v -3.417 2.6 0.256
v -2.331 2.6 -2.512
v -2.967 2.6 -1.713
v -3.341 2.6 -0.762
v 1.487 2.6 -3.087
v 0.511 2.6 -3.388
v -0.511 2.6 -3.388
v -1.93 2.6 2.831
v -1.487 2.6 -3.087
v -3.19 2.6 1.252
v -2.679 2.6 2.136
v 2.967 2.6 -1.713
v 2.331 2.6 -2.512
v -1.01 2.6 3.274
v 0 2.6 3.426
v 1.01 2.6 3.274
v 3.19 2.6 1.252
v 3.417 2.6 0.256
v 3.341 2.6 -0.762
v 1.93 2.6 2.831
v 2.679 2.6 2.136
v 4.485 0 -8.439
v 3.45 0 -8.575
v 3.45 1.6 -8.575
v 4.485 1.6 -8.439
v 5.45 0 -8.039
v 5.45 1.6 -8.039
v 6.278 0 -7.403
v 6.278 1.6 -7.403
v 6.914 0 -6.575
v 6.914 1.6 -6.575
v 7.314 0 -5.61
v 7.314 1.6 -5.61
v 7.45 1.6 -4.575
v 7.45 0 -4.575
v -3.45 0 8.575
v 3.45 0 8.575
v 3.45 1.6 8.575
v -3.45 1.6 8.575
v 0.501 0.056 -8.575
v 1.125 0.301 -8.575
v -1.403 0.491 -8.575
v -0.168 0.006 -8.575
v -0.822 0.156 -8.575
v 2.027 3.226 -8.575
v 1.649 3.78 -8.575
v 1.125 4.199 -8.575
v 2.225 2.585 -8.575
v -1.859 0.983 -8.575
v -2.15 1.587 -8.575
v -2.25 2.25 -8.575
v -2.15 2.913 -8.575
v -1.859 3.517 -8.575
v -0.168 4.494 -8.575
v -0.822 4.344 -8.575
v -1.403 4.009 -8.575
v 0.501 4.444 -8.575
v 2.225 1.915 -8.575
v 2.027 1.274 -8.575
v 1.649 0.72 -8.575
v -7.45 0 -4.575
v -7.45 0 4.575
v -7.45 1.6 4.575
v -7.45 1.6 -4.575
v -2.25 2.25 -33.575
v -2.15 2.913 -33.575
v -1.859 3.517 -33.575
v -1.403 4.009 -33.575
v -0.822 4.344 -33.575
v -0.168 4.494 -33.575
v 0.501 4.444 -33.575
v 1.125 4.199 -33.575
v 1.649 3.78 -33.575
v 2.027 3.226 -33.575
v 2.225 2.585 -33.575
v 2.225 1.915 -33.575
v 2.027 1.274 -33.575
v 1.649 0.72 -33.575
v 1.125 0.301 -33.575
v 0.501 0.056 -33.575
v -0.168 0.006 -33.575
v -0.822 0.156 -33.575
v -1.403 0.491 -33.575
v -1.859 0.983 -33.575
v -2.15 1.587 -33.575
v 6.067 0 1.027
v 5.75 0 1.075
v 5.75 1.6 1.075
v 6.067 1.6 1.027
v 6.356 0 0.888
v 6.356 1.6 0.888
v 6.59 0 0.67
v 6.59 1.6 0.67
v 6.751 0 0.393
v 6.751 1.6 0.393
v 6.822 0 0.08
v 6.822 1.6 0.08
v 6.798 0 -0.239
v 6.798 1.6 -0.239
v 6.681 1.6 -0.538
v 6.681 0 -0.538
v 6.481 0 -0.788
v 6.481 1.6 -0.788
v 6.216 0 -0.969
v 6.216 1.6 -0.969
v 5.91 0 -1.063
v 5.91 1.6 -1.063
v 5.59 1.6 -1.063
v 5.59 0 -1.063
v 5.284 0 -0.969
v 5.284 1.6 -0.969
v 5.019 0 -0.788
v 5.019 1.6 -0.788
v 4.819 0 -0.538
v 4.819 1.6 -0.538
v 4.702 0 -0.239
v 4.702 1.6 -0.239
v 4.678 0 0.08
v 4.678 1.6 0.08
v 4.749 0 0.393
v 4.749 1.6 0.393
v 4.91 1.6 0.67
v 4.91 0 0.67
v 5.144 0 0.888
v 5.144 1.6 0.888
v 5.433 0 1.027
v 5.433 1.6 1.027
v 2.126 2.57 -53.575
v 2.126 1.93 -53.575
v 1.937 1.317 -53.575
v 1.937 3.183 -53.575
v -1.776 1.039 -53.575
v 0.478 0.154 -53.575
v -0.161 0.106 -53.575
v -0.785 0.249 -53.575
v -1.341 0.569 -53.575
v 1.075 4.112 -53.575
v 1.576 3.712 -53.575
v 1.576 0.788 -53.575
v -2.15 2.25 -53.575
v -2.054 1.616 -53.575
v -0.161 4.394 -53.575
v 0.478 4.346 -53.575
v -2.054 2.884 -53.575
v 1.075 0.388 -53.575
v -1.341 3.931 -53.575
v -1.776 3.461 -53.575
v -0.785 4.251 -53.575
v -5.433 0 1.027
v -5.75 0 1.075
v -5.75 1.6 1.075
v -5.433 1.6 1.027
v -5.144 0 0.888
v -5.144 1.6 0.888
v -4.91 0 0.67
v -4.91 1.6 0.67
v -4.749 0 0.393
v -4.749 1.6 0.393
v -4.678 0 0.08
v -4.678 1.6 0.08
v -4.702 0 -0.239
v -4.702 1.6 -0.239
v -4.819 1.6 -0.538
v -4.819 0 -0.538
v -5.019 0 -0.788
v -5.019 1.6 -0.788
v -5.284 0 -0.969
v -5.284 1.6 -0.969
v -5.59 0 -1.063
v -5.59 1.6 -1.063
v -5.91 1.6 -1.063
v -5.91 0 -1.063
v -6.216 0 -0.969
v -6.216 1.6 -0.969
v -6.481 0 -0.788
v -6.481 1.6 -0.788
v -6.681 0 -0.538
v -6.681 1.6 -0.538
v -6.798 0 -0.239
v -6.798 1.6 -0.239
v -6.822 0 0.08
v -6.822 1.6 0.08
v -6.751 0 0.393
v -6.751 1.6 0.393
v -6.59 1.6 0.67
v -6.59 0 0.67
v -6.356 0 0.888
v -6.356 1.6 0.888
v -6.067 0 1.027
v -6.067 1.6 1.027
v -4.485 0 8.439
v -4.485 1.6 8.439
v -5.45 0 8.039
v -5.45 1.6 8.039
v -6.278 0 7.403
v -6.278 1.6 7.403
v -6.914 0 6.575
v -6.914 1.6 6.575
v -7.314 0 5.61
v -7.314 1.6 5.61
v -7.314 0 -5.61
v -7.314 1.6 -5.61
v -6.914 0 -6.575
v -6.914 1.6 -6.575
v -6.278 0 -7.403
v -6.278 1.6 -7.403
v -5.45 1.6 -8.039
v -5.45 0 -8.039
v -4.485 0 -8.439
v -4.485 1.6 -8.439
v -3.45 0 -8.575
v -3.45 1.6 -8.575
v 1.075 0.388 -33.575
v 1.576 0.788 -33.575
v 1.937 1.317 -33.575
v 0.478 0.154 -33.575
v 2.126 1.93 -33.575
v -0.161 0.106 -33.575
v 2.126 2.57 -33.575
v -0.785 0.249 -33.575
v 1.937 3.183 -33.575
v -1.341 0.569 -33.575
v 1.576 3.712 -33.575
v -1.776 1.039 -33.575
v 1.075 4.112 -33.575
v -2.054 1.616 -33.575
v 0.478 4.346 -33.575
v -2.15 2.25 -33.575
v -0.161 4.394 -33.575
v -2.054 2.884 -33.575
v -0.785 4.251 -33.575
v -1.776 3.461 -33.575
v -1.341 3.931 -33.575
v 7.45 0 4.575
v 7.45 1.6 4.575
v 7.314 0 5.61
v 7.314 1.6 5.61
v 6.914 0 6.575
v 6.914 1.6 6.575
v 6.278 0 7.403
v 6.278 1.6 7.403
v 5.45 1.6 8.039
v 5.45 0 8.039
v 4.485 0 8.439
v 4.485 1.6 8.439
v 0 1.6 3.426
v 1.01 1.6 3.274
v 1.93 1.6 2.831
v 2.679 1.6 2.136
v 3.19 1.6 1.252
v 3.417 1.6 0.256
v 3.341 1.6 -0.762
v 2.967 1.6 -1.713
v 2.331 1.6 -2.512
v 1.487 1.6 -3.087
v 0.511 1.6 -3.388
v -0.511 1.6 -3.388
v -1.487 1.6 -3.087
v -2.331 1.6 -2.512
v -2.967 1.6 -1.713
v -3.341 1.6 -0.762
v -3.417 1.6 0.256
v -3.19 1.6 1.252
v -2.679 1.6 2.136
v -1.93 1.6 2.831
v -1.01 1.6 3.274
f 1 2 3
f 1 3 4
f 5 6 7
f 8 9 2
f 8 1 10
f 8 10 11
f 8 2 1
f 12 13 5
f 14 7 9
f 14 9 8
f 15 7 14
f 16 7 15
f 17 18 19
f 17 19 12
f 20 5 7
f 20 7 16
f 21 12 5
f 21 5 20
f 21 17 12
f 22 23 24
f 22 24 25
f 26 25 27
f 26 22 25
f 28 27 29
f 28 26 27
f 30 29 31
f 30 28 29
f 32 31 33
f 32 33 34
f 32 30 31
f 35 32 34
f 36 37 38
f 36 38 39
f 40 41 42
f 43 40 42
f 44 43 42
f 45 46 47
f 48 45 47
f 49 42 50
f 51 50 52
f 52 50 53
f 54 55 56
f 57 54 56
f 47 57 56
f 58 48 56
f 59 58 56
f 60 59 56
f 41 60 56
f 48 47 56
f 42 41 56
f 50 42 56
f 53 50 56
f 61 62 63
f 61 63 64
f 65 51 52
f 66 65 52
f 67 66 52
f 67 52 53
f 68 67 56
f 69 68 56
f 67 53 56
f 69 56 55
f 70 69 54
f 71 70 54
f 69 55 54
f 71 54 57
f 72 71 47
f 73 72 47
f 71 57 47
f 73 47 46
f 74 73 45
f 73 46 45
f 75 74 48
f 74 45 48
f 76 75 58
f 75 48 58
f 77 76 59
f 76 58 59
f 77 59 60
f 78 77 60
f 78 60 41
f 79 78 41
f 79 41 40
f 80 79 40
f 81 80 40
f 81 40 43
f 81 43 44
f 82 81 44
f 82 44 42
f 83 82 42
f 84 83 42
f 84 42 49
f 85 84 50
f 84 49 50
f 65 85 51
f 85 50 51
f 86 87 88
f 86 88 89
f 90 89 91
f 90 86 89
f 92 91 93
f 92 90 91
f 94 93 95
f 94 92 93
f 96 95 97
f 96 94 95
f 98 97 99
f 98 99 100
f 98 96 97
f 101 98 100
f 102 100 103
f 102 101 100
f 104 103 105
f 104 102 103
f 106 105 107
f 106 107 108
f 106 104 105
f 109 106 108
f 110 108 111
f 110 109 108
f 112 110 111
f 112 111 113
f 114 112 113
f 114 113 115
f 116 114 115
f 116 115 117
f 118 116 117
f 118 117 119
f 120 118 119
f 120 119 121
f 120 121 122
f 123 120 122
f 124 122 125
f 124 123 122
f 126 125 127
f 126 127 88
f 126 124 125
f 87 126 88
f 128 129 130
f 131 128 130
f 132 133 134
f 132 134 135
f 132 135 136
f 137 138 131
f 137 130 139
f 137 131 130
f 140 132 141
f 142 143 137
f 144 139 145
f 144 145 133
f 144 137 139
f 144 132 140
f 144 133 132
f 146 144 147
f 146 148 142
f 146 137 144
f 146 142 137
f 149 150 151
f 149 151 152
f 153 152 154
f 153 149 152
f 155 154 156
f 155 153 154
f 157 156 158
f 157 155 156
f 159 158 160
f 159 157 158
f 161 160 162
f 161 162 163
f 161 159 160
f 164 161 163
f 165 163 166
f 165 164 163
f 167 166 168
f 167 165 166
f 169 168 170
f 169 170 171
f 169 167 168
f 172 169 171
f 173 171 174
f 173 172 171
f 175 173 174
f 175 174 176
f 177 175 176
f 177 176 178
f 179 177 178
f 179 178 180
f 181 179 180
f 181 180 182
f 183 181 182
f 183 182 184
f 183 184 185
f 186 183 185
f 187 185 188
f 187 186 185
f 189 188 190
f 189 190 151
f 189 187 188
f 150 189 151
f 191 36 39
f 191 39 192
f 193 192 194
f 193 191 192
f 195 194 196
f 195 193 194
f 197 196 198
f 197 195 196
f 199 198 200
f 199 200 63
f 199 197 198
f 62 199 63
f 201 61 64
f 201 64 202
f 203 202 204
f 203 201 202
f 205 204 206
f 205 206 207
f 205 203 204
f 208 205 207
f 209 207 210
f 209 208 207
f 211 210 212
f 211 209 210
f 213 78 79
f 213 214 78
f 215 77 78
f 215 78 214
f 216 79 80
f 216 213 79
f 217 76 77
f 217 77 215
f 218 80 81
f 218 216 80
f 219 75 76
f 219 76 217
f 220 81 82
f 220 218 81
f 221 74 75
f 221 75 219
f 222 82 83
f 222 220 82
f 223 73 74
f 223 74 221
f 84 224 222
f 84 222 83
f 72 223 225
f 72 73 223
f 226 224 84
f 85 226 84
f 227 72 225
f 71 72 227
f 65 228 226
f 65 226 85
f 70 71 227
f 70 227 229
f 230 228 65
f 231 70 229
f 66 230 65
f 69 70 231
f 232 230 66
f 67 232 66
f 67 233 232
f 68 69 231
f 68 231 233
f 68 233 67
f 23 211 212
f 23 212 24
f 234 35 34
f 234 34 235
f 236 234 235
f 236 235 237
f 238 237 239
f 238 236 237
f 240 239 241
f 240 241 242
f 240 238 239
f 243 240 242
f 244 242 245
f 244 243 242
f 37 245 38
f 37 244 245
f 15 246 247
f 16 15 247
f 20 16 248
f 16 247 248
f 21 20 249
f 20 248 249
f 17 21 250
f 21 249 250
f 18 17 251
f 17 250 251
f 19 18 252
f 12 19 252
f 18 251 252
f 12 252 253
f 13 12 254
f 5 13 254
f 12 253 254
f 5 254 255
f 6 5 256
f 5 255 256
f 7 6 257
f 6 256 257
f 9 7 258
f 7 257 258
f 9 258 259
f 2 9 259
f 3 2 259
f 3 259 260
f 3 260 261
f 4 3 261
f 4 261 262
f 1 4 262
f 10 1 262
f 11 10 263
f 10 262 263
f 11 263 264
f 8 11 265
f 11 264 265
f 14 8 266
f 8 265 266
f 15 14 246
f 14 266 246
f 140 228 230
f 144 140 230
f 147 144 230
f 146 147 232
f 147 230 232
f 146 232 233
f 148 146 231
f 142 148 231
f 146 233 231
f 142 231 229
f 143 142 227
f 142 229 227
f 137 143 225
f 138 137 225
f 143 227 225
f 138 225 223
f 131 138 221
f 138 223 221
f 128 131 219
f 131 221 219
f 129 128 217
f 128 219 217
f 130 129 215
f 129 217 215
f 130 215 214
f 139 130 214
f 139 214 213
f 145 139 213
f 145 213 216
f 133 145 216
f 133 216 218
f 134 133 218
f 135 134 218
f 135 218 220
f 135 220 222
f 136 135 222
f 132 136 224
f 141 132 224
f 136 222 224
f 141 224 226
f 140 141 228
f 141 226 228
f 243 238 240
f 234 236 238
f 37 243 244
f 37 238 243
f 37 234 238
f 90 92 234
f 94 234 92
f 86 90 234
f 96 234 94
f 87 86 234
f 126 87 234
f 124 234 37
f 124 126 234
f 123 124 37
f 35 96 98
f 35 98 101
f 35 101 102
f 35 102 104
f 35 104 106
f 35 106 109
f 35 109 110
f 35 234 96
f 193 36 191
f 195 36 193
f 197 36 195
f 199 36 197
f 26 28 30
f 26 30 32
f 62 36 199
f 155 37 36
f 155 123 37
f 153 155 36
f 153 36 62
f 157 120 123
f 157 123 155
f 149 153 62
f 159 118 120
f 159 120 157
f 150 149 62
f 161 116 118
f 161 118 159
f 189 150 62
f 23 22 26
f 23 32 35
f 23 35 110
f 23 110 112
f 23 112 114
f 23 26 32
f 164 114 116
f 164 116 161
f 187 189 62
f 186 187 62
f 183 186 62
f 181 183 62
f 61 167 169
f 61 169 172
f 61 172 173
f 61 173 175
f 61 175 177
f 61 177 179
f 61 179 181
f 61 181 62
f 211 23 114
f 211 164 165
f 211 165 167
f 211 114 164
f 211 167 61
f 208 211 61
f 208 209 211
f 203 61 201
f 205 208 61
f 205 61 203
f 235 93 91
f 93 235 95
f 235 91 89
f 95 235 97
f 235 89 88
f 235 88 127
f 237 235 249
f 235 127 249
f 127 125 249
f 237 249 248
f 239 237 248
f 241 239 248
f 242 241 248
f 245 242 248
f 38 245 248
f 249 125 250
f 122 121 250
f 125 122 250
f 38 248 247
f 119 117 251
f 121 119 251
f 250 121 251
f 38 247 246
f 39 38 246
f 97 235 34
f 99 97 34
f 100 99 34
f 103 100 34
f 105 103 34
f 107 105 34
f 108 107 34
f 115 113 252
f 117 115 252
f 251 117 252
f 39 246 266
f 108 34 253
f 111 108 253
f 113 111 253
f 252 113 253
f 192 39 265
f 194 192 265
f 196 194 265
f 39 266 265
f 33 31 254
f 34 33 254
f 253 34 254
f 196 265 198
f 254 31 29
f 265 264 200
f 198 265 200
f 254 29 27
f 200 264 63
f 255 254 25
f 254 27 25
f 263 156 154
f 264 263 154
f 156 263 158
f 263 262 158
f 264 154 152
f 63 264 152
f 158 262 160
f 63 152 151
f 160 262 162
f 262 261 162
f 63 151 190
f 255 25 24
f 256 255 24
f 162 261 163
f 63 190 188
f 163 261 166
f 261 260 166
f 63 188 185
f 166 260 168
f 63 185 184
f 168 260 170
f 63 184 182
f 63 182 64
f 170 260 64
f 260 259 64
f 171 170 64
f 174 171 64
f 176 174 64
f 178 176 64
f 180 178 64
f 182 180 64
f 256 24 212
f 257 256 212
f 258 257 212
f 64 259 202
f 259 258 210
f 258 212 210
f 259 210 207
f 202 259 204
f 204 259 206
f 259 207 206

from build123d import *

# Parameters (mm, degrees)
SKETCH1_R           = 1.075
BOSS_EXTRUDE1_DEPTH = 1.6
SKETCH2_R           = 3.426475787
BOSS_EXTRUDE2_DEPTH = 1
SKETCH4_R           = 2.25
BOSS_EXTRUDE3_DEPTH = 25
SKETCH5_R           = 2.15
BOSS_EXTRUDE4_DEPTH = 20


with BuildPart() as part:
    # Sketch1 → Boss-Extrude1 (new body)
    with BuildSketch(Plane(origin=(0, 0, 0), x_dir=(1, 0, 0), z_dir=(0, 1, 0))):
        with BuildLine():
            Line((-3.45, 8.575), (3.45, 8.575))
            ThreePointArc((3.45, 8.575), (6.278427125, 7.403427125), (7.45, 4.575))
            Line((7.45, 4.575), (7.45, -4.575))
            ThreePointArc((7.45, -4.575), (6.278427125, -7.403427125), (3.45, -8.575))
            Line((3.45, -8.575), (-3.45, -8.575))
            ThreePointArc((-3.45, -8.575), (-6.278427125, -7.403427125), (-7.45, -4.575))
            Line((-7.45, -4.575), (-7.45, 4.575))
            ThreePointArc((-7.45, 4.575), (-6.278427125, 7.403427125), (-3.45, 8.575))
        make_face()
        with Locations(Location((-5.75, 0, 0), (0, 0, 270))):
            Circle(SKETCH1_R, mode=Mode.SUBTRACT)
        with Locations(Location((5.75, 0, 0), (0, 0, 270))):
            Circle(SKETCH1_R, mode=Mode.SUBTRACT)
    extrude(amount=BOSS_EXTRUDE1_DEPTH)

    # Sketch2 → Boss-Extrude2 (add)
    with BuildSketch(Plane(origin=(0, 1.6, 0), x_dir=(1, 0, 0), z_dir=(0, 1, 0))):
        with Locations(Location((0, 0, 0), (0, 0, 270))):
            Circle(SKETCH2_R)
    extrude(amount=BOSS_EXTRUDE2_DEPTH)


with BuildPart() as body_2:
    # Sketch4 → Boss-Extrude3 (new body)
    with BuildSketch(Plane(origin=(0, 0, -8.575), x_dir=(-1, 0, 0), z_dir=(0, 0, -1))):
        with Locations((0, 2.25)):
            Circle(SKETCH4_R)
    extrude(amount=BOSS_EXTRUDE3_DEPTH)

    # Sketch5 → Boss-Extrude4 (add)
    with BuildSketch(Plane(origin=(0, 0, -33.575), x_dir=(-1, 0, 0), z_dir=(0, 0, -1))):
        with Locations((0, 2.25)):
            Circle(SKETCH5_R)
    extrude(amount=BOSS_EXTRUDE4_DEPTH)


solid = Compound([part.part, body_2.part])
